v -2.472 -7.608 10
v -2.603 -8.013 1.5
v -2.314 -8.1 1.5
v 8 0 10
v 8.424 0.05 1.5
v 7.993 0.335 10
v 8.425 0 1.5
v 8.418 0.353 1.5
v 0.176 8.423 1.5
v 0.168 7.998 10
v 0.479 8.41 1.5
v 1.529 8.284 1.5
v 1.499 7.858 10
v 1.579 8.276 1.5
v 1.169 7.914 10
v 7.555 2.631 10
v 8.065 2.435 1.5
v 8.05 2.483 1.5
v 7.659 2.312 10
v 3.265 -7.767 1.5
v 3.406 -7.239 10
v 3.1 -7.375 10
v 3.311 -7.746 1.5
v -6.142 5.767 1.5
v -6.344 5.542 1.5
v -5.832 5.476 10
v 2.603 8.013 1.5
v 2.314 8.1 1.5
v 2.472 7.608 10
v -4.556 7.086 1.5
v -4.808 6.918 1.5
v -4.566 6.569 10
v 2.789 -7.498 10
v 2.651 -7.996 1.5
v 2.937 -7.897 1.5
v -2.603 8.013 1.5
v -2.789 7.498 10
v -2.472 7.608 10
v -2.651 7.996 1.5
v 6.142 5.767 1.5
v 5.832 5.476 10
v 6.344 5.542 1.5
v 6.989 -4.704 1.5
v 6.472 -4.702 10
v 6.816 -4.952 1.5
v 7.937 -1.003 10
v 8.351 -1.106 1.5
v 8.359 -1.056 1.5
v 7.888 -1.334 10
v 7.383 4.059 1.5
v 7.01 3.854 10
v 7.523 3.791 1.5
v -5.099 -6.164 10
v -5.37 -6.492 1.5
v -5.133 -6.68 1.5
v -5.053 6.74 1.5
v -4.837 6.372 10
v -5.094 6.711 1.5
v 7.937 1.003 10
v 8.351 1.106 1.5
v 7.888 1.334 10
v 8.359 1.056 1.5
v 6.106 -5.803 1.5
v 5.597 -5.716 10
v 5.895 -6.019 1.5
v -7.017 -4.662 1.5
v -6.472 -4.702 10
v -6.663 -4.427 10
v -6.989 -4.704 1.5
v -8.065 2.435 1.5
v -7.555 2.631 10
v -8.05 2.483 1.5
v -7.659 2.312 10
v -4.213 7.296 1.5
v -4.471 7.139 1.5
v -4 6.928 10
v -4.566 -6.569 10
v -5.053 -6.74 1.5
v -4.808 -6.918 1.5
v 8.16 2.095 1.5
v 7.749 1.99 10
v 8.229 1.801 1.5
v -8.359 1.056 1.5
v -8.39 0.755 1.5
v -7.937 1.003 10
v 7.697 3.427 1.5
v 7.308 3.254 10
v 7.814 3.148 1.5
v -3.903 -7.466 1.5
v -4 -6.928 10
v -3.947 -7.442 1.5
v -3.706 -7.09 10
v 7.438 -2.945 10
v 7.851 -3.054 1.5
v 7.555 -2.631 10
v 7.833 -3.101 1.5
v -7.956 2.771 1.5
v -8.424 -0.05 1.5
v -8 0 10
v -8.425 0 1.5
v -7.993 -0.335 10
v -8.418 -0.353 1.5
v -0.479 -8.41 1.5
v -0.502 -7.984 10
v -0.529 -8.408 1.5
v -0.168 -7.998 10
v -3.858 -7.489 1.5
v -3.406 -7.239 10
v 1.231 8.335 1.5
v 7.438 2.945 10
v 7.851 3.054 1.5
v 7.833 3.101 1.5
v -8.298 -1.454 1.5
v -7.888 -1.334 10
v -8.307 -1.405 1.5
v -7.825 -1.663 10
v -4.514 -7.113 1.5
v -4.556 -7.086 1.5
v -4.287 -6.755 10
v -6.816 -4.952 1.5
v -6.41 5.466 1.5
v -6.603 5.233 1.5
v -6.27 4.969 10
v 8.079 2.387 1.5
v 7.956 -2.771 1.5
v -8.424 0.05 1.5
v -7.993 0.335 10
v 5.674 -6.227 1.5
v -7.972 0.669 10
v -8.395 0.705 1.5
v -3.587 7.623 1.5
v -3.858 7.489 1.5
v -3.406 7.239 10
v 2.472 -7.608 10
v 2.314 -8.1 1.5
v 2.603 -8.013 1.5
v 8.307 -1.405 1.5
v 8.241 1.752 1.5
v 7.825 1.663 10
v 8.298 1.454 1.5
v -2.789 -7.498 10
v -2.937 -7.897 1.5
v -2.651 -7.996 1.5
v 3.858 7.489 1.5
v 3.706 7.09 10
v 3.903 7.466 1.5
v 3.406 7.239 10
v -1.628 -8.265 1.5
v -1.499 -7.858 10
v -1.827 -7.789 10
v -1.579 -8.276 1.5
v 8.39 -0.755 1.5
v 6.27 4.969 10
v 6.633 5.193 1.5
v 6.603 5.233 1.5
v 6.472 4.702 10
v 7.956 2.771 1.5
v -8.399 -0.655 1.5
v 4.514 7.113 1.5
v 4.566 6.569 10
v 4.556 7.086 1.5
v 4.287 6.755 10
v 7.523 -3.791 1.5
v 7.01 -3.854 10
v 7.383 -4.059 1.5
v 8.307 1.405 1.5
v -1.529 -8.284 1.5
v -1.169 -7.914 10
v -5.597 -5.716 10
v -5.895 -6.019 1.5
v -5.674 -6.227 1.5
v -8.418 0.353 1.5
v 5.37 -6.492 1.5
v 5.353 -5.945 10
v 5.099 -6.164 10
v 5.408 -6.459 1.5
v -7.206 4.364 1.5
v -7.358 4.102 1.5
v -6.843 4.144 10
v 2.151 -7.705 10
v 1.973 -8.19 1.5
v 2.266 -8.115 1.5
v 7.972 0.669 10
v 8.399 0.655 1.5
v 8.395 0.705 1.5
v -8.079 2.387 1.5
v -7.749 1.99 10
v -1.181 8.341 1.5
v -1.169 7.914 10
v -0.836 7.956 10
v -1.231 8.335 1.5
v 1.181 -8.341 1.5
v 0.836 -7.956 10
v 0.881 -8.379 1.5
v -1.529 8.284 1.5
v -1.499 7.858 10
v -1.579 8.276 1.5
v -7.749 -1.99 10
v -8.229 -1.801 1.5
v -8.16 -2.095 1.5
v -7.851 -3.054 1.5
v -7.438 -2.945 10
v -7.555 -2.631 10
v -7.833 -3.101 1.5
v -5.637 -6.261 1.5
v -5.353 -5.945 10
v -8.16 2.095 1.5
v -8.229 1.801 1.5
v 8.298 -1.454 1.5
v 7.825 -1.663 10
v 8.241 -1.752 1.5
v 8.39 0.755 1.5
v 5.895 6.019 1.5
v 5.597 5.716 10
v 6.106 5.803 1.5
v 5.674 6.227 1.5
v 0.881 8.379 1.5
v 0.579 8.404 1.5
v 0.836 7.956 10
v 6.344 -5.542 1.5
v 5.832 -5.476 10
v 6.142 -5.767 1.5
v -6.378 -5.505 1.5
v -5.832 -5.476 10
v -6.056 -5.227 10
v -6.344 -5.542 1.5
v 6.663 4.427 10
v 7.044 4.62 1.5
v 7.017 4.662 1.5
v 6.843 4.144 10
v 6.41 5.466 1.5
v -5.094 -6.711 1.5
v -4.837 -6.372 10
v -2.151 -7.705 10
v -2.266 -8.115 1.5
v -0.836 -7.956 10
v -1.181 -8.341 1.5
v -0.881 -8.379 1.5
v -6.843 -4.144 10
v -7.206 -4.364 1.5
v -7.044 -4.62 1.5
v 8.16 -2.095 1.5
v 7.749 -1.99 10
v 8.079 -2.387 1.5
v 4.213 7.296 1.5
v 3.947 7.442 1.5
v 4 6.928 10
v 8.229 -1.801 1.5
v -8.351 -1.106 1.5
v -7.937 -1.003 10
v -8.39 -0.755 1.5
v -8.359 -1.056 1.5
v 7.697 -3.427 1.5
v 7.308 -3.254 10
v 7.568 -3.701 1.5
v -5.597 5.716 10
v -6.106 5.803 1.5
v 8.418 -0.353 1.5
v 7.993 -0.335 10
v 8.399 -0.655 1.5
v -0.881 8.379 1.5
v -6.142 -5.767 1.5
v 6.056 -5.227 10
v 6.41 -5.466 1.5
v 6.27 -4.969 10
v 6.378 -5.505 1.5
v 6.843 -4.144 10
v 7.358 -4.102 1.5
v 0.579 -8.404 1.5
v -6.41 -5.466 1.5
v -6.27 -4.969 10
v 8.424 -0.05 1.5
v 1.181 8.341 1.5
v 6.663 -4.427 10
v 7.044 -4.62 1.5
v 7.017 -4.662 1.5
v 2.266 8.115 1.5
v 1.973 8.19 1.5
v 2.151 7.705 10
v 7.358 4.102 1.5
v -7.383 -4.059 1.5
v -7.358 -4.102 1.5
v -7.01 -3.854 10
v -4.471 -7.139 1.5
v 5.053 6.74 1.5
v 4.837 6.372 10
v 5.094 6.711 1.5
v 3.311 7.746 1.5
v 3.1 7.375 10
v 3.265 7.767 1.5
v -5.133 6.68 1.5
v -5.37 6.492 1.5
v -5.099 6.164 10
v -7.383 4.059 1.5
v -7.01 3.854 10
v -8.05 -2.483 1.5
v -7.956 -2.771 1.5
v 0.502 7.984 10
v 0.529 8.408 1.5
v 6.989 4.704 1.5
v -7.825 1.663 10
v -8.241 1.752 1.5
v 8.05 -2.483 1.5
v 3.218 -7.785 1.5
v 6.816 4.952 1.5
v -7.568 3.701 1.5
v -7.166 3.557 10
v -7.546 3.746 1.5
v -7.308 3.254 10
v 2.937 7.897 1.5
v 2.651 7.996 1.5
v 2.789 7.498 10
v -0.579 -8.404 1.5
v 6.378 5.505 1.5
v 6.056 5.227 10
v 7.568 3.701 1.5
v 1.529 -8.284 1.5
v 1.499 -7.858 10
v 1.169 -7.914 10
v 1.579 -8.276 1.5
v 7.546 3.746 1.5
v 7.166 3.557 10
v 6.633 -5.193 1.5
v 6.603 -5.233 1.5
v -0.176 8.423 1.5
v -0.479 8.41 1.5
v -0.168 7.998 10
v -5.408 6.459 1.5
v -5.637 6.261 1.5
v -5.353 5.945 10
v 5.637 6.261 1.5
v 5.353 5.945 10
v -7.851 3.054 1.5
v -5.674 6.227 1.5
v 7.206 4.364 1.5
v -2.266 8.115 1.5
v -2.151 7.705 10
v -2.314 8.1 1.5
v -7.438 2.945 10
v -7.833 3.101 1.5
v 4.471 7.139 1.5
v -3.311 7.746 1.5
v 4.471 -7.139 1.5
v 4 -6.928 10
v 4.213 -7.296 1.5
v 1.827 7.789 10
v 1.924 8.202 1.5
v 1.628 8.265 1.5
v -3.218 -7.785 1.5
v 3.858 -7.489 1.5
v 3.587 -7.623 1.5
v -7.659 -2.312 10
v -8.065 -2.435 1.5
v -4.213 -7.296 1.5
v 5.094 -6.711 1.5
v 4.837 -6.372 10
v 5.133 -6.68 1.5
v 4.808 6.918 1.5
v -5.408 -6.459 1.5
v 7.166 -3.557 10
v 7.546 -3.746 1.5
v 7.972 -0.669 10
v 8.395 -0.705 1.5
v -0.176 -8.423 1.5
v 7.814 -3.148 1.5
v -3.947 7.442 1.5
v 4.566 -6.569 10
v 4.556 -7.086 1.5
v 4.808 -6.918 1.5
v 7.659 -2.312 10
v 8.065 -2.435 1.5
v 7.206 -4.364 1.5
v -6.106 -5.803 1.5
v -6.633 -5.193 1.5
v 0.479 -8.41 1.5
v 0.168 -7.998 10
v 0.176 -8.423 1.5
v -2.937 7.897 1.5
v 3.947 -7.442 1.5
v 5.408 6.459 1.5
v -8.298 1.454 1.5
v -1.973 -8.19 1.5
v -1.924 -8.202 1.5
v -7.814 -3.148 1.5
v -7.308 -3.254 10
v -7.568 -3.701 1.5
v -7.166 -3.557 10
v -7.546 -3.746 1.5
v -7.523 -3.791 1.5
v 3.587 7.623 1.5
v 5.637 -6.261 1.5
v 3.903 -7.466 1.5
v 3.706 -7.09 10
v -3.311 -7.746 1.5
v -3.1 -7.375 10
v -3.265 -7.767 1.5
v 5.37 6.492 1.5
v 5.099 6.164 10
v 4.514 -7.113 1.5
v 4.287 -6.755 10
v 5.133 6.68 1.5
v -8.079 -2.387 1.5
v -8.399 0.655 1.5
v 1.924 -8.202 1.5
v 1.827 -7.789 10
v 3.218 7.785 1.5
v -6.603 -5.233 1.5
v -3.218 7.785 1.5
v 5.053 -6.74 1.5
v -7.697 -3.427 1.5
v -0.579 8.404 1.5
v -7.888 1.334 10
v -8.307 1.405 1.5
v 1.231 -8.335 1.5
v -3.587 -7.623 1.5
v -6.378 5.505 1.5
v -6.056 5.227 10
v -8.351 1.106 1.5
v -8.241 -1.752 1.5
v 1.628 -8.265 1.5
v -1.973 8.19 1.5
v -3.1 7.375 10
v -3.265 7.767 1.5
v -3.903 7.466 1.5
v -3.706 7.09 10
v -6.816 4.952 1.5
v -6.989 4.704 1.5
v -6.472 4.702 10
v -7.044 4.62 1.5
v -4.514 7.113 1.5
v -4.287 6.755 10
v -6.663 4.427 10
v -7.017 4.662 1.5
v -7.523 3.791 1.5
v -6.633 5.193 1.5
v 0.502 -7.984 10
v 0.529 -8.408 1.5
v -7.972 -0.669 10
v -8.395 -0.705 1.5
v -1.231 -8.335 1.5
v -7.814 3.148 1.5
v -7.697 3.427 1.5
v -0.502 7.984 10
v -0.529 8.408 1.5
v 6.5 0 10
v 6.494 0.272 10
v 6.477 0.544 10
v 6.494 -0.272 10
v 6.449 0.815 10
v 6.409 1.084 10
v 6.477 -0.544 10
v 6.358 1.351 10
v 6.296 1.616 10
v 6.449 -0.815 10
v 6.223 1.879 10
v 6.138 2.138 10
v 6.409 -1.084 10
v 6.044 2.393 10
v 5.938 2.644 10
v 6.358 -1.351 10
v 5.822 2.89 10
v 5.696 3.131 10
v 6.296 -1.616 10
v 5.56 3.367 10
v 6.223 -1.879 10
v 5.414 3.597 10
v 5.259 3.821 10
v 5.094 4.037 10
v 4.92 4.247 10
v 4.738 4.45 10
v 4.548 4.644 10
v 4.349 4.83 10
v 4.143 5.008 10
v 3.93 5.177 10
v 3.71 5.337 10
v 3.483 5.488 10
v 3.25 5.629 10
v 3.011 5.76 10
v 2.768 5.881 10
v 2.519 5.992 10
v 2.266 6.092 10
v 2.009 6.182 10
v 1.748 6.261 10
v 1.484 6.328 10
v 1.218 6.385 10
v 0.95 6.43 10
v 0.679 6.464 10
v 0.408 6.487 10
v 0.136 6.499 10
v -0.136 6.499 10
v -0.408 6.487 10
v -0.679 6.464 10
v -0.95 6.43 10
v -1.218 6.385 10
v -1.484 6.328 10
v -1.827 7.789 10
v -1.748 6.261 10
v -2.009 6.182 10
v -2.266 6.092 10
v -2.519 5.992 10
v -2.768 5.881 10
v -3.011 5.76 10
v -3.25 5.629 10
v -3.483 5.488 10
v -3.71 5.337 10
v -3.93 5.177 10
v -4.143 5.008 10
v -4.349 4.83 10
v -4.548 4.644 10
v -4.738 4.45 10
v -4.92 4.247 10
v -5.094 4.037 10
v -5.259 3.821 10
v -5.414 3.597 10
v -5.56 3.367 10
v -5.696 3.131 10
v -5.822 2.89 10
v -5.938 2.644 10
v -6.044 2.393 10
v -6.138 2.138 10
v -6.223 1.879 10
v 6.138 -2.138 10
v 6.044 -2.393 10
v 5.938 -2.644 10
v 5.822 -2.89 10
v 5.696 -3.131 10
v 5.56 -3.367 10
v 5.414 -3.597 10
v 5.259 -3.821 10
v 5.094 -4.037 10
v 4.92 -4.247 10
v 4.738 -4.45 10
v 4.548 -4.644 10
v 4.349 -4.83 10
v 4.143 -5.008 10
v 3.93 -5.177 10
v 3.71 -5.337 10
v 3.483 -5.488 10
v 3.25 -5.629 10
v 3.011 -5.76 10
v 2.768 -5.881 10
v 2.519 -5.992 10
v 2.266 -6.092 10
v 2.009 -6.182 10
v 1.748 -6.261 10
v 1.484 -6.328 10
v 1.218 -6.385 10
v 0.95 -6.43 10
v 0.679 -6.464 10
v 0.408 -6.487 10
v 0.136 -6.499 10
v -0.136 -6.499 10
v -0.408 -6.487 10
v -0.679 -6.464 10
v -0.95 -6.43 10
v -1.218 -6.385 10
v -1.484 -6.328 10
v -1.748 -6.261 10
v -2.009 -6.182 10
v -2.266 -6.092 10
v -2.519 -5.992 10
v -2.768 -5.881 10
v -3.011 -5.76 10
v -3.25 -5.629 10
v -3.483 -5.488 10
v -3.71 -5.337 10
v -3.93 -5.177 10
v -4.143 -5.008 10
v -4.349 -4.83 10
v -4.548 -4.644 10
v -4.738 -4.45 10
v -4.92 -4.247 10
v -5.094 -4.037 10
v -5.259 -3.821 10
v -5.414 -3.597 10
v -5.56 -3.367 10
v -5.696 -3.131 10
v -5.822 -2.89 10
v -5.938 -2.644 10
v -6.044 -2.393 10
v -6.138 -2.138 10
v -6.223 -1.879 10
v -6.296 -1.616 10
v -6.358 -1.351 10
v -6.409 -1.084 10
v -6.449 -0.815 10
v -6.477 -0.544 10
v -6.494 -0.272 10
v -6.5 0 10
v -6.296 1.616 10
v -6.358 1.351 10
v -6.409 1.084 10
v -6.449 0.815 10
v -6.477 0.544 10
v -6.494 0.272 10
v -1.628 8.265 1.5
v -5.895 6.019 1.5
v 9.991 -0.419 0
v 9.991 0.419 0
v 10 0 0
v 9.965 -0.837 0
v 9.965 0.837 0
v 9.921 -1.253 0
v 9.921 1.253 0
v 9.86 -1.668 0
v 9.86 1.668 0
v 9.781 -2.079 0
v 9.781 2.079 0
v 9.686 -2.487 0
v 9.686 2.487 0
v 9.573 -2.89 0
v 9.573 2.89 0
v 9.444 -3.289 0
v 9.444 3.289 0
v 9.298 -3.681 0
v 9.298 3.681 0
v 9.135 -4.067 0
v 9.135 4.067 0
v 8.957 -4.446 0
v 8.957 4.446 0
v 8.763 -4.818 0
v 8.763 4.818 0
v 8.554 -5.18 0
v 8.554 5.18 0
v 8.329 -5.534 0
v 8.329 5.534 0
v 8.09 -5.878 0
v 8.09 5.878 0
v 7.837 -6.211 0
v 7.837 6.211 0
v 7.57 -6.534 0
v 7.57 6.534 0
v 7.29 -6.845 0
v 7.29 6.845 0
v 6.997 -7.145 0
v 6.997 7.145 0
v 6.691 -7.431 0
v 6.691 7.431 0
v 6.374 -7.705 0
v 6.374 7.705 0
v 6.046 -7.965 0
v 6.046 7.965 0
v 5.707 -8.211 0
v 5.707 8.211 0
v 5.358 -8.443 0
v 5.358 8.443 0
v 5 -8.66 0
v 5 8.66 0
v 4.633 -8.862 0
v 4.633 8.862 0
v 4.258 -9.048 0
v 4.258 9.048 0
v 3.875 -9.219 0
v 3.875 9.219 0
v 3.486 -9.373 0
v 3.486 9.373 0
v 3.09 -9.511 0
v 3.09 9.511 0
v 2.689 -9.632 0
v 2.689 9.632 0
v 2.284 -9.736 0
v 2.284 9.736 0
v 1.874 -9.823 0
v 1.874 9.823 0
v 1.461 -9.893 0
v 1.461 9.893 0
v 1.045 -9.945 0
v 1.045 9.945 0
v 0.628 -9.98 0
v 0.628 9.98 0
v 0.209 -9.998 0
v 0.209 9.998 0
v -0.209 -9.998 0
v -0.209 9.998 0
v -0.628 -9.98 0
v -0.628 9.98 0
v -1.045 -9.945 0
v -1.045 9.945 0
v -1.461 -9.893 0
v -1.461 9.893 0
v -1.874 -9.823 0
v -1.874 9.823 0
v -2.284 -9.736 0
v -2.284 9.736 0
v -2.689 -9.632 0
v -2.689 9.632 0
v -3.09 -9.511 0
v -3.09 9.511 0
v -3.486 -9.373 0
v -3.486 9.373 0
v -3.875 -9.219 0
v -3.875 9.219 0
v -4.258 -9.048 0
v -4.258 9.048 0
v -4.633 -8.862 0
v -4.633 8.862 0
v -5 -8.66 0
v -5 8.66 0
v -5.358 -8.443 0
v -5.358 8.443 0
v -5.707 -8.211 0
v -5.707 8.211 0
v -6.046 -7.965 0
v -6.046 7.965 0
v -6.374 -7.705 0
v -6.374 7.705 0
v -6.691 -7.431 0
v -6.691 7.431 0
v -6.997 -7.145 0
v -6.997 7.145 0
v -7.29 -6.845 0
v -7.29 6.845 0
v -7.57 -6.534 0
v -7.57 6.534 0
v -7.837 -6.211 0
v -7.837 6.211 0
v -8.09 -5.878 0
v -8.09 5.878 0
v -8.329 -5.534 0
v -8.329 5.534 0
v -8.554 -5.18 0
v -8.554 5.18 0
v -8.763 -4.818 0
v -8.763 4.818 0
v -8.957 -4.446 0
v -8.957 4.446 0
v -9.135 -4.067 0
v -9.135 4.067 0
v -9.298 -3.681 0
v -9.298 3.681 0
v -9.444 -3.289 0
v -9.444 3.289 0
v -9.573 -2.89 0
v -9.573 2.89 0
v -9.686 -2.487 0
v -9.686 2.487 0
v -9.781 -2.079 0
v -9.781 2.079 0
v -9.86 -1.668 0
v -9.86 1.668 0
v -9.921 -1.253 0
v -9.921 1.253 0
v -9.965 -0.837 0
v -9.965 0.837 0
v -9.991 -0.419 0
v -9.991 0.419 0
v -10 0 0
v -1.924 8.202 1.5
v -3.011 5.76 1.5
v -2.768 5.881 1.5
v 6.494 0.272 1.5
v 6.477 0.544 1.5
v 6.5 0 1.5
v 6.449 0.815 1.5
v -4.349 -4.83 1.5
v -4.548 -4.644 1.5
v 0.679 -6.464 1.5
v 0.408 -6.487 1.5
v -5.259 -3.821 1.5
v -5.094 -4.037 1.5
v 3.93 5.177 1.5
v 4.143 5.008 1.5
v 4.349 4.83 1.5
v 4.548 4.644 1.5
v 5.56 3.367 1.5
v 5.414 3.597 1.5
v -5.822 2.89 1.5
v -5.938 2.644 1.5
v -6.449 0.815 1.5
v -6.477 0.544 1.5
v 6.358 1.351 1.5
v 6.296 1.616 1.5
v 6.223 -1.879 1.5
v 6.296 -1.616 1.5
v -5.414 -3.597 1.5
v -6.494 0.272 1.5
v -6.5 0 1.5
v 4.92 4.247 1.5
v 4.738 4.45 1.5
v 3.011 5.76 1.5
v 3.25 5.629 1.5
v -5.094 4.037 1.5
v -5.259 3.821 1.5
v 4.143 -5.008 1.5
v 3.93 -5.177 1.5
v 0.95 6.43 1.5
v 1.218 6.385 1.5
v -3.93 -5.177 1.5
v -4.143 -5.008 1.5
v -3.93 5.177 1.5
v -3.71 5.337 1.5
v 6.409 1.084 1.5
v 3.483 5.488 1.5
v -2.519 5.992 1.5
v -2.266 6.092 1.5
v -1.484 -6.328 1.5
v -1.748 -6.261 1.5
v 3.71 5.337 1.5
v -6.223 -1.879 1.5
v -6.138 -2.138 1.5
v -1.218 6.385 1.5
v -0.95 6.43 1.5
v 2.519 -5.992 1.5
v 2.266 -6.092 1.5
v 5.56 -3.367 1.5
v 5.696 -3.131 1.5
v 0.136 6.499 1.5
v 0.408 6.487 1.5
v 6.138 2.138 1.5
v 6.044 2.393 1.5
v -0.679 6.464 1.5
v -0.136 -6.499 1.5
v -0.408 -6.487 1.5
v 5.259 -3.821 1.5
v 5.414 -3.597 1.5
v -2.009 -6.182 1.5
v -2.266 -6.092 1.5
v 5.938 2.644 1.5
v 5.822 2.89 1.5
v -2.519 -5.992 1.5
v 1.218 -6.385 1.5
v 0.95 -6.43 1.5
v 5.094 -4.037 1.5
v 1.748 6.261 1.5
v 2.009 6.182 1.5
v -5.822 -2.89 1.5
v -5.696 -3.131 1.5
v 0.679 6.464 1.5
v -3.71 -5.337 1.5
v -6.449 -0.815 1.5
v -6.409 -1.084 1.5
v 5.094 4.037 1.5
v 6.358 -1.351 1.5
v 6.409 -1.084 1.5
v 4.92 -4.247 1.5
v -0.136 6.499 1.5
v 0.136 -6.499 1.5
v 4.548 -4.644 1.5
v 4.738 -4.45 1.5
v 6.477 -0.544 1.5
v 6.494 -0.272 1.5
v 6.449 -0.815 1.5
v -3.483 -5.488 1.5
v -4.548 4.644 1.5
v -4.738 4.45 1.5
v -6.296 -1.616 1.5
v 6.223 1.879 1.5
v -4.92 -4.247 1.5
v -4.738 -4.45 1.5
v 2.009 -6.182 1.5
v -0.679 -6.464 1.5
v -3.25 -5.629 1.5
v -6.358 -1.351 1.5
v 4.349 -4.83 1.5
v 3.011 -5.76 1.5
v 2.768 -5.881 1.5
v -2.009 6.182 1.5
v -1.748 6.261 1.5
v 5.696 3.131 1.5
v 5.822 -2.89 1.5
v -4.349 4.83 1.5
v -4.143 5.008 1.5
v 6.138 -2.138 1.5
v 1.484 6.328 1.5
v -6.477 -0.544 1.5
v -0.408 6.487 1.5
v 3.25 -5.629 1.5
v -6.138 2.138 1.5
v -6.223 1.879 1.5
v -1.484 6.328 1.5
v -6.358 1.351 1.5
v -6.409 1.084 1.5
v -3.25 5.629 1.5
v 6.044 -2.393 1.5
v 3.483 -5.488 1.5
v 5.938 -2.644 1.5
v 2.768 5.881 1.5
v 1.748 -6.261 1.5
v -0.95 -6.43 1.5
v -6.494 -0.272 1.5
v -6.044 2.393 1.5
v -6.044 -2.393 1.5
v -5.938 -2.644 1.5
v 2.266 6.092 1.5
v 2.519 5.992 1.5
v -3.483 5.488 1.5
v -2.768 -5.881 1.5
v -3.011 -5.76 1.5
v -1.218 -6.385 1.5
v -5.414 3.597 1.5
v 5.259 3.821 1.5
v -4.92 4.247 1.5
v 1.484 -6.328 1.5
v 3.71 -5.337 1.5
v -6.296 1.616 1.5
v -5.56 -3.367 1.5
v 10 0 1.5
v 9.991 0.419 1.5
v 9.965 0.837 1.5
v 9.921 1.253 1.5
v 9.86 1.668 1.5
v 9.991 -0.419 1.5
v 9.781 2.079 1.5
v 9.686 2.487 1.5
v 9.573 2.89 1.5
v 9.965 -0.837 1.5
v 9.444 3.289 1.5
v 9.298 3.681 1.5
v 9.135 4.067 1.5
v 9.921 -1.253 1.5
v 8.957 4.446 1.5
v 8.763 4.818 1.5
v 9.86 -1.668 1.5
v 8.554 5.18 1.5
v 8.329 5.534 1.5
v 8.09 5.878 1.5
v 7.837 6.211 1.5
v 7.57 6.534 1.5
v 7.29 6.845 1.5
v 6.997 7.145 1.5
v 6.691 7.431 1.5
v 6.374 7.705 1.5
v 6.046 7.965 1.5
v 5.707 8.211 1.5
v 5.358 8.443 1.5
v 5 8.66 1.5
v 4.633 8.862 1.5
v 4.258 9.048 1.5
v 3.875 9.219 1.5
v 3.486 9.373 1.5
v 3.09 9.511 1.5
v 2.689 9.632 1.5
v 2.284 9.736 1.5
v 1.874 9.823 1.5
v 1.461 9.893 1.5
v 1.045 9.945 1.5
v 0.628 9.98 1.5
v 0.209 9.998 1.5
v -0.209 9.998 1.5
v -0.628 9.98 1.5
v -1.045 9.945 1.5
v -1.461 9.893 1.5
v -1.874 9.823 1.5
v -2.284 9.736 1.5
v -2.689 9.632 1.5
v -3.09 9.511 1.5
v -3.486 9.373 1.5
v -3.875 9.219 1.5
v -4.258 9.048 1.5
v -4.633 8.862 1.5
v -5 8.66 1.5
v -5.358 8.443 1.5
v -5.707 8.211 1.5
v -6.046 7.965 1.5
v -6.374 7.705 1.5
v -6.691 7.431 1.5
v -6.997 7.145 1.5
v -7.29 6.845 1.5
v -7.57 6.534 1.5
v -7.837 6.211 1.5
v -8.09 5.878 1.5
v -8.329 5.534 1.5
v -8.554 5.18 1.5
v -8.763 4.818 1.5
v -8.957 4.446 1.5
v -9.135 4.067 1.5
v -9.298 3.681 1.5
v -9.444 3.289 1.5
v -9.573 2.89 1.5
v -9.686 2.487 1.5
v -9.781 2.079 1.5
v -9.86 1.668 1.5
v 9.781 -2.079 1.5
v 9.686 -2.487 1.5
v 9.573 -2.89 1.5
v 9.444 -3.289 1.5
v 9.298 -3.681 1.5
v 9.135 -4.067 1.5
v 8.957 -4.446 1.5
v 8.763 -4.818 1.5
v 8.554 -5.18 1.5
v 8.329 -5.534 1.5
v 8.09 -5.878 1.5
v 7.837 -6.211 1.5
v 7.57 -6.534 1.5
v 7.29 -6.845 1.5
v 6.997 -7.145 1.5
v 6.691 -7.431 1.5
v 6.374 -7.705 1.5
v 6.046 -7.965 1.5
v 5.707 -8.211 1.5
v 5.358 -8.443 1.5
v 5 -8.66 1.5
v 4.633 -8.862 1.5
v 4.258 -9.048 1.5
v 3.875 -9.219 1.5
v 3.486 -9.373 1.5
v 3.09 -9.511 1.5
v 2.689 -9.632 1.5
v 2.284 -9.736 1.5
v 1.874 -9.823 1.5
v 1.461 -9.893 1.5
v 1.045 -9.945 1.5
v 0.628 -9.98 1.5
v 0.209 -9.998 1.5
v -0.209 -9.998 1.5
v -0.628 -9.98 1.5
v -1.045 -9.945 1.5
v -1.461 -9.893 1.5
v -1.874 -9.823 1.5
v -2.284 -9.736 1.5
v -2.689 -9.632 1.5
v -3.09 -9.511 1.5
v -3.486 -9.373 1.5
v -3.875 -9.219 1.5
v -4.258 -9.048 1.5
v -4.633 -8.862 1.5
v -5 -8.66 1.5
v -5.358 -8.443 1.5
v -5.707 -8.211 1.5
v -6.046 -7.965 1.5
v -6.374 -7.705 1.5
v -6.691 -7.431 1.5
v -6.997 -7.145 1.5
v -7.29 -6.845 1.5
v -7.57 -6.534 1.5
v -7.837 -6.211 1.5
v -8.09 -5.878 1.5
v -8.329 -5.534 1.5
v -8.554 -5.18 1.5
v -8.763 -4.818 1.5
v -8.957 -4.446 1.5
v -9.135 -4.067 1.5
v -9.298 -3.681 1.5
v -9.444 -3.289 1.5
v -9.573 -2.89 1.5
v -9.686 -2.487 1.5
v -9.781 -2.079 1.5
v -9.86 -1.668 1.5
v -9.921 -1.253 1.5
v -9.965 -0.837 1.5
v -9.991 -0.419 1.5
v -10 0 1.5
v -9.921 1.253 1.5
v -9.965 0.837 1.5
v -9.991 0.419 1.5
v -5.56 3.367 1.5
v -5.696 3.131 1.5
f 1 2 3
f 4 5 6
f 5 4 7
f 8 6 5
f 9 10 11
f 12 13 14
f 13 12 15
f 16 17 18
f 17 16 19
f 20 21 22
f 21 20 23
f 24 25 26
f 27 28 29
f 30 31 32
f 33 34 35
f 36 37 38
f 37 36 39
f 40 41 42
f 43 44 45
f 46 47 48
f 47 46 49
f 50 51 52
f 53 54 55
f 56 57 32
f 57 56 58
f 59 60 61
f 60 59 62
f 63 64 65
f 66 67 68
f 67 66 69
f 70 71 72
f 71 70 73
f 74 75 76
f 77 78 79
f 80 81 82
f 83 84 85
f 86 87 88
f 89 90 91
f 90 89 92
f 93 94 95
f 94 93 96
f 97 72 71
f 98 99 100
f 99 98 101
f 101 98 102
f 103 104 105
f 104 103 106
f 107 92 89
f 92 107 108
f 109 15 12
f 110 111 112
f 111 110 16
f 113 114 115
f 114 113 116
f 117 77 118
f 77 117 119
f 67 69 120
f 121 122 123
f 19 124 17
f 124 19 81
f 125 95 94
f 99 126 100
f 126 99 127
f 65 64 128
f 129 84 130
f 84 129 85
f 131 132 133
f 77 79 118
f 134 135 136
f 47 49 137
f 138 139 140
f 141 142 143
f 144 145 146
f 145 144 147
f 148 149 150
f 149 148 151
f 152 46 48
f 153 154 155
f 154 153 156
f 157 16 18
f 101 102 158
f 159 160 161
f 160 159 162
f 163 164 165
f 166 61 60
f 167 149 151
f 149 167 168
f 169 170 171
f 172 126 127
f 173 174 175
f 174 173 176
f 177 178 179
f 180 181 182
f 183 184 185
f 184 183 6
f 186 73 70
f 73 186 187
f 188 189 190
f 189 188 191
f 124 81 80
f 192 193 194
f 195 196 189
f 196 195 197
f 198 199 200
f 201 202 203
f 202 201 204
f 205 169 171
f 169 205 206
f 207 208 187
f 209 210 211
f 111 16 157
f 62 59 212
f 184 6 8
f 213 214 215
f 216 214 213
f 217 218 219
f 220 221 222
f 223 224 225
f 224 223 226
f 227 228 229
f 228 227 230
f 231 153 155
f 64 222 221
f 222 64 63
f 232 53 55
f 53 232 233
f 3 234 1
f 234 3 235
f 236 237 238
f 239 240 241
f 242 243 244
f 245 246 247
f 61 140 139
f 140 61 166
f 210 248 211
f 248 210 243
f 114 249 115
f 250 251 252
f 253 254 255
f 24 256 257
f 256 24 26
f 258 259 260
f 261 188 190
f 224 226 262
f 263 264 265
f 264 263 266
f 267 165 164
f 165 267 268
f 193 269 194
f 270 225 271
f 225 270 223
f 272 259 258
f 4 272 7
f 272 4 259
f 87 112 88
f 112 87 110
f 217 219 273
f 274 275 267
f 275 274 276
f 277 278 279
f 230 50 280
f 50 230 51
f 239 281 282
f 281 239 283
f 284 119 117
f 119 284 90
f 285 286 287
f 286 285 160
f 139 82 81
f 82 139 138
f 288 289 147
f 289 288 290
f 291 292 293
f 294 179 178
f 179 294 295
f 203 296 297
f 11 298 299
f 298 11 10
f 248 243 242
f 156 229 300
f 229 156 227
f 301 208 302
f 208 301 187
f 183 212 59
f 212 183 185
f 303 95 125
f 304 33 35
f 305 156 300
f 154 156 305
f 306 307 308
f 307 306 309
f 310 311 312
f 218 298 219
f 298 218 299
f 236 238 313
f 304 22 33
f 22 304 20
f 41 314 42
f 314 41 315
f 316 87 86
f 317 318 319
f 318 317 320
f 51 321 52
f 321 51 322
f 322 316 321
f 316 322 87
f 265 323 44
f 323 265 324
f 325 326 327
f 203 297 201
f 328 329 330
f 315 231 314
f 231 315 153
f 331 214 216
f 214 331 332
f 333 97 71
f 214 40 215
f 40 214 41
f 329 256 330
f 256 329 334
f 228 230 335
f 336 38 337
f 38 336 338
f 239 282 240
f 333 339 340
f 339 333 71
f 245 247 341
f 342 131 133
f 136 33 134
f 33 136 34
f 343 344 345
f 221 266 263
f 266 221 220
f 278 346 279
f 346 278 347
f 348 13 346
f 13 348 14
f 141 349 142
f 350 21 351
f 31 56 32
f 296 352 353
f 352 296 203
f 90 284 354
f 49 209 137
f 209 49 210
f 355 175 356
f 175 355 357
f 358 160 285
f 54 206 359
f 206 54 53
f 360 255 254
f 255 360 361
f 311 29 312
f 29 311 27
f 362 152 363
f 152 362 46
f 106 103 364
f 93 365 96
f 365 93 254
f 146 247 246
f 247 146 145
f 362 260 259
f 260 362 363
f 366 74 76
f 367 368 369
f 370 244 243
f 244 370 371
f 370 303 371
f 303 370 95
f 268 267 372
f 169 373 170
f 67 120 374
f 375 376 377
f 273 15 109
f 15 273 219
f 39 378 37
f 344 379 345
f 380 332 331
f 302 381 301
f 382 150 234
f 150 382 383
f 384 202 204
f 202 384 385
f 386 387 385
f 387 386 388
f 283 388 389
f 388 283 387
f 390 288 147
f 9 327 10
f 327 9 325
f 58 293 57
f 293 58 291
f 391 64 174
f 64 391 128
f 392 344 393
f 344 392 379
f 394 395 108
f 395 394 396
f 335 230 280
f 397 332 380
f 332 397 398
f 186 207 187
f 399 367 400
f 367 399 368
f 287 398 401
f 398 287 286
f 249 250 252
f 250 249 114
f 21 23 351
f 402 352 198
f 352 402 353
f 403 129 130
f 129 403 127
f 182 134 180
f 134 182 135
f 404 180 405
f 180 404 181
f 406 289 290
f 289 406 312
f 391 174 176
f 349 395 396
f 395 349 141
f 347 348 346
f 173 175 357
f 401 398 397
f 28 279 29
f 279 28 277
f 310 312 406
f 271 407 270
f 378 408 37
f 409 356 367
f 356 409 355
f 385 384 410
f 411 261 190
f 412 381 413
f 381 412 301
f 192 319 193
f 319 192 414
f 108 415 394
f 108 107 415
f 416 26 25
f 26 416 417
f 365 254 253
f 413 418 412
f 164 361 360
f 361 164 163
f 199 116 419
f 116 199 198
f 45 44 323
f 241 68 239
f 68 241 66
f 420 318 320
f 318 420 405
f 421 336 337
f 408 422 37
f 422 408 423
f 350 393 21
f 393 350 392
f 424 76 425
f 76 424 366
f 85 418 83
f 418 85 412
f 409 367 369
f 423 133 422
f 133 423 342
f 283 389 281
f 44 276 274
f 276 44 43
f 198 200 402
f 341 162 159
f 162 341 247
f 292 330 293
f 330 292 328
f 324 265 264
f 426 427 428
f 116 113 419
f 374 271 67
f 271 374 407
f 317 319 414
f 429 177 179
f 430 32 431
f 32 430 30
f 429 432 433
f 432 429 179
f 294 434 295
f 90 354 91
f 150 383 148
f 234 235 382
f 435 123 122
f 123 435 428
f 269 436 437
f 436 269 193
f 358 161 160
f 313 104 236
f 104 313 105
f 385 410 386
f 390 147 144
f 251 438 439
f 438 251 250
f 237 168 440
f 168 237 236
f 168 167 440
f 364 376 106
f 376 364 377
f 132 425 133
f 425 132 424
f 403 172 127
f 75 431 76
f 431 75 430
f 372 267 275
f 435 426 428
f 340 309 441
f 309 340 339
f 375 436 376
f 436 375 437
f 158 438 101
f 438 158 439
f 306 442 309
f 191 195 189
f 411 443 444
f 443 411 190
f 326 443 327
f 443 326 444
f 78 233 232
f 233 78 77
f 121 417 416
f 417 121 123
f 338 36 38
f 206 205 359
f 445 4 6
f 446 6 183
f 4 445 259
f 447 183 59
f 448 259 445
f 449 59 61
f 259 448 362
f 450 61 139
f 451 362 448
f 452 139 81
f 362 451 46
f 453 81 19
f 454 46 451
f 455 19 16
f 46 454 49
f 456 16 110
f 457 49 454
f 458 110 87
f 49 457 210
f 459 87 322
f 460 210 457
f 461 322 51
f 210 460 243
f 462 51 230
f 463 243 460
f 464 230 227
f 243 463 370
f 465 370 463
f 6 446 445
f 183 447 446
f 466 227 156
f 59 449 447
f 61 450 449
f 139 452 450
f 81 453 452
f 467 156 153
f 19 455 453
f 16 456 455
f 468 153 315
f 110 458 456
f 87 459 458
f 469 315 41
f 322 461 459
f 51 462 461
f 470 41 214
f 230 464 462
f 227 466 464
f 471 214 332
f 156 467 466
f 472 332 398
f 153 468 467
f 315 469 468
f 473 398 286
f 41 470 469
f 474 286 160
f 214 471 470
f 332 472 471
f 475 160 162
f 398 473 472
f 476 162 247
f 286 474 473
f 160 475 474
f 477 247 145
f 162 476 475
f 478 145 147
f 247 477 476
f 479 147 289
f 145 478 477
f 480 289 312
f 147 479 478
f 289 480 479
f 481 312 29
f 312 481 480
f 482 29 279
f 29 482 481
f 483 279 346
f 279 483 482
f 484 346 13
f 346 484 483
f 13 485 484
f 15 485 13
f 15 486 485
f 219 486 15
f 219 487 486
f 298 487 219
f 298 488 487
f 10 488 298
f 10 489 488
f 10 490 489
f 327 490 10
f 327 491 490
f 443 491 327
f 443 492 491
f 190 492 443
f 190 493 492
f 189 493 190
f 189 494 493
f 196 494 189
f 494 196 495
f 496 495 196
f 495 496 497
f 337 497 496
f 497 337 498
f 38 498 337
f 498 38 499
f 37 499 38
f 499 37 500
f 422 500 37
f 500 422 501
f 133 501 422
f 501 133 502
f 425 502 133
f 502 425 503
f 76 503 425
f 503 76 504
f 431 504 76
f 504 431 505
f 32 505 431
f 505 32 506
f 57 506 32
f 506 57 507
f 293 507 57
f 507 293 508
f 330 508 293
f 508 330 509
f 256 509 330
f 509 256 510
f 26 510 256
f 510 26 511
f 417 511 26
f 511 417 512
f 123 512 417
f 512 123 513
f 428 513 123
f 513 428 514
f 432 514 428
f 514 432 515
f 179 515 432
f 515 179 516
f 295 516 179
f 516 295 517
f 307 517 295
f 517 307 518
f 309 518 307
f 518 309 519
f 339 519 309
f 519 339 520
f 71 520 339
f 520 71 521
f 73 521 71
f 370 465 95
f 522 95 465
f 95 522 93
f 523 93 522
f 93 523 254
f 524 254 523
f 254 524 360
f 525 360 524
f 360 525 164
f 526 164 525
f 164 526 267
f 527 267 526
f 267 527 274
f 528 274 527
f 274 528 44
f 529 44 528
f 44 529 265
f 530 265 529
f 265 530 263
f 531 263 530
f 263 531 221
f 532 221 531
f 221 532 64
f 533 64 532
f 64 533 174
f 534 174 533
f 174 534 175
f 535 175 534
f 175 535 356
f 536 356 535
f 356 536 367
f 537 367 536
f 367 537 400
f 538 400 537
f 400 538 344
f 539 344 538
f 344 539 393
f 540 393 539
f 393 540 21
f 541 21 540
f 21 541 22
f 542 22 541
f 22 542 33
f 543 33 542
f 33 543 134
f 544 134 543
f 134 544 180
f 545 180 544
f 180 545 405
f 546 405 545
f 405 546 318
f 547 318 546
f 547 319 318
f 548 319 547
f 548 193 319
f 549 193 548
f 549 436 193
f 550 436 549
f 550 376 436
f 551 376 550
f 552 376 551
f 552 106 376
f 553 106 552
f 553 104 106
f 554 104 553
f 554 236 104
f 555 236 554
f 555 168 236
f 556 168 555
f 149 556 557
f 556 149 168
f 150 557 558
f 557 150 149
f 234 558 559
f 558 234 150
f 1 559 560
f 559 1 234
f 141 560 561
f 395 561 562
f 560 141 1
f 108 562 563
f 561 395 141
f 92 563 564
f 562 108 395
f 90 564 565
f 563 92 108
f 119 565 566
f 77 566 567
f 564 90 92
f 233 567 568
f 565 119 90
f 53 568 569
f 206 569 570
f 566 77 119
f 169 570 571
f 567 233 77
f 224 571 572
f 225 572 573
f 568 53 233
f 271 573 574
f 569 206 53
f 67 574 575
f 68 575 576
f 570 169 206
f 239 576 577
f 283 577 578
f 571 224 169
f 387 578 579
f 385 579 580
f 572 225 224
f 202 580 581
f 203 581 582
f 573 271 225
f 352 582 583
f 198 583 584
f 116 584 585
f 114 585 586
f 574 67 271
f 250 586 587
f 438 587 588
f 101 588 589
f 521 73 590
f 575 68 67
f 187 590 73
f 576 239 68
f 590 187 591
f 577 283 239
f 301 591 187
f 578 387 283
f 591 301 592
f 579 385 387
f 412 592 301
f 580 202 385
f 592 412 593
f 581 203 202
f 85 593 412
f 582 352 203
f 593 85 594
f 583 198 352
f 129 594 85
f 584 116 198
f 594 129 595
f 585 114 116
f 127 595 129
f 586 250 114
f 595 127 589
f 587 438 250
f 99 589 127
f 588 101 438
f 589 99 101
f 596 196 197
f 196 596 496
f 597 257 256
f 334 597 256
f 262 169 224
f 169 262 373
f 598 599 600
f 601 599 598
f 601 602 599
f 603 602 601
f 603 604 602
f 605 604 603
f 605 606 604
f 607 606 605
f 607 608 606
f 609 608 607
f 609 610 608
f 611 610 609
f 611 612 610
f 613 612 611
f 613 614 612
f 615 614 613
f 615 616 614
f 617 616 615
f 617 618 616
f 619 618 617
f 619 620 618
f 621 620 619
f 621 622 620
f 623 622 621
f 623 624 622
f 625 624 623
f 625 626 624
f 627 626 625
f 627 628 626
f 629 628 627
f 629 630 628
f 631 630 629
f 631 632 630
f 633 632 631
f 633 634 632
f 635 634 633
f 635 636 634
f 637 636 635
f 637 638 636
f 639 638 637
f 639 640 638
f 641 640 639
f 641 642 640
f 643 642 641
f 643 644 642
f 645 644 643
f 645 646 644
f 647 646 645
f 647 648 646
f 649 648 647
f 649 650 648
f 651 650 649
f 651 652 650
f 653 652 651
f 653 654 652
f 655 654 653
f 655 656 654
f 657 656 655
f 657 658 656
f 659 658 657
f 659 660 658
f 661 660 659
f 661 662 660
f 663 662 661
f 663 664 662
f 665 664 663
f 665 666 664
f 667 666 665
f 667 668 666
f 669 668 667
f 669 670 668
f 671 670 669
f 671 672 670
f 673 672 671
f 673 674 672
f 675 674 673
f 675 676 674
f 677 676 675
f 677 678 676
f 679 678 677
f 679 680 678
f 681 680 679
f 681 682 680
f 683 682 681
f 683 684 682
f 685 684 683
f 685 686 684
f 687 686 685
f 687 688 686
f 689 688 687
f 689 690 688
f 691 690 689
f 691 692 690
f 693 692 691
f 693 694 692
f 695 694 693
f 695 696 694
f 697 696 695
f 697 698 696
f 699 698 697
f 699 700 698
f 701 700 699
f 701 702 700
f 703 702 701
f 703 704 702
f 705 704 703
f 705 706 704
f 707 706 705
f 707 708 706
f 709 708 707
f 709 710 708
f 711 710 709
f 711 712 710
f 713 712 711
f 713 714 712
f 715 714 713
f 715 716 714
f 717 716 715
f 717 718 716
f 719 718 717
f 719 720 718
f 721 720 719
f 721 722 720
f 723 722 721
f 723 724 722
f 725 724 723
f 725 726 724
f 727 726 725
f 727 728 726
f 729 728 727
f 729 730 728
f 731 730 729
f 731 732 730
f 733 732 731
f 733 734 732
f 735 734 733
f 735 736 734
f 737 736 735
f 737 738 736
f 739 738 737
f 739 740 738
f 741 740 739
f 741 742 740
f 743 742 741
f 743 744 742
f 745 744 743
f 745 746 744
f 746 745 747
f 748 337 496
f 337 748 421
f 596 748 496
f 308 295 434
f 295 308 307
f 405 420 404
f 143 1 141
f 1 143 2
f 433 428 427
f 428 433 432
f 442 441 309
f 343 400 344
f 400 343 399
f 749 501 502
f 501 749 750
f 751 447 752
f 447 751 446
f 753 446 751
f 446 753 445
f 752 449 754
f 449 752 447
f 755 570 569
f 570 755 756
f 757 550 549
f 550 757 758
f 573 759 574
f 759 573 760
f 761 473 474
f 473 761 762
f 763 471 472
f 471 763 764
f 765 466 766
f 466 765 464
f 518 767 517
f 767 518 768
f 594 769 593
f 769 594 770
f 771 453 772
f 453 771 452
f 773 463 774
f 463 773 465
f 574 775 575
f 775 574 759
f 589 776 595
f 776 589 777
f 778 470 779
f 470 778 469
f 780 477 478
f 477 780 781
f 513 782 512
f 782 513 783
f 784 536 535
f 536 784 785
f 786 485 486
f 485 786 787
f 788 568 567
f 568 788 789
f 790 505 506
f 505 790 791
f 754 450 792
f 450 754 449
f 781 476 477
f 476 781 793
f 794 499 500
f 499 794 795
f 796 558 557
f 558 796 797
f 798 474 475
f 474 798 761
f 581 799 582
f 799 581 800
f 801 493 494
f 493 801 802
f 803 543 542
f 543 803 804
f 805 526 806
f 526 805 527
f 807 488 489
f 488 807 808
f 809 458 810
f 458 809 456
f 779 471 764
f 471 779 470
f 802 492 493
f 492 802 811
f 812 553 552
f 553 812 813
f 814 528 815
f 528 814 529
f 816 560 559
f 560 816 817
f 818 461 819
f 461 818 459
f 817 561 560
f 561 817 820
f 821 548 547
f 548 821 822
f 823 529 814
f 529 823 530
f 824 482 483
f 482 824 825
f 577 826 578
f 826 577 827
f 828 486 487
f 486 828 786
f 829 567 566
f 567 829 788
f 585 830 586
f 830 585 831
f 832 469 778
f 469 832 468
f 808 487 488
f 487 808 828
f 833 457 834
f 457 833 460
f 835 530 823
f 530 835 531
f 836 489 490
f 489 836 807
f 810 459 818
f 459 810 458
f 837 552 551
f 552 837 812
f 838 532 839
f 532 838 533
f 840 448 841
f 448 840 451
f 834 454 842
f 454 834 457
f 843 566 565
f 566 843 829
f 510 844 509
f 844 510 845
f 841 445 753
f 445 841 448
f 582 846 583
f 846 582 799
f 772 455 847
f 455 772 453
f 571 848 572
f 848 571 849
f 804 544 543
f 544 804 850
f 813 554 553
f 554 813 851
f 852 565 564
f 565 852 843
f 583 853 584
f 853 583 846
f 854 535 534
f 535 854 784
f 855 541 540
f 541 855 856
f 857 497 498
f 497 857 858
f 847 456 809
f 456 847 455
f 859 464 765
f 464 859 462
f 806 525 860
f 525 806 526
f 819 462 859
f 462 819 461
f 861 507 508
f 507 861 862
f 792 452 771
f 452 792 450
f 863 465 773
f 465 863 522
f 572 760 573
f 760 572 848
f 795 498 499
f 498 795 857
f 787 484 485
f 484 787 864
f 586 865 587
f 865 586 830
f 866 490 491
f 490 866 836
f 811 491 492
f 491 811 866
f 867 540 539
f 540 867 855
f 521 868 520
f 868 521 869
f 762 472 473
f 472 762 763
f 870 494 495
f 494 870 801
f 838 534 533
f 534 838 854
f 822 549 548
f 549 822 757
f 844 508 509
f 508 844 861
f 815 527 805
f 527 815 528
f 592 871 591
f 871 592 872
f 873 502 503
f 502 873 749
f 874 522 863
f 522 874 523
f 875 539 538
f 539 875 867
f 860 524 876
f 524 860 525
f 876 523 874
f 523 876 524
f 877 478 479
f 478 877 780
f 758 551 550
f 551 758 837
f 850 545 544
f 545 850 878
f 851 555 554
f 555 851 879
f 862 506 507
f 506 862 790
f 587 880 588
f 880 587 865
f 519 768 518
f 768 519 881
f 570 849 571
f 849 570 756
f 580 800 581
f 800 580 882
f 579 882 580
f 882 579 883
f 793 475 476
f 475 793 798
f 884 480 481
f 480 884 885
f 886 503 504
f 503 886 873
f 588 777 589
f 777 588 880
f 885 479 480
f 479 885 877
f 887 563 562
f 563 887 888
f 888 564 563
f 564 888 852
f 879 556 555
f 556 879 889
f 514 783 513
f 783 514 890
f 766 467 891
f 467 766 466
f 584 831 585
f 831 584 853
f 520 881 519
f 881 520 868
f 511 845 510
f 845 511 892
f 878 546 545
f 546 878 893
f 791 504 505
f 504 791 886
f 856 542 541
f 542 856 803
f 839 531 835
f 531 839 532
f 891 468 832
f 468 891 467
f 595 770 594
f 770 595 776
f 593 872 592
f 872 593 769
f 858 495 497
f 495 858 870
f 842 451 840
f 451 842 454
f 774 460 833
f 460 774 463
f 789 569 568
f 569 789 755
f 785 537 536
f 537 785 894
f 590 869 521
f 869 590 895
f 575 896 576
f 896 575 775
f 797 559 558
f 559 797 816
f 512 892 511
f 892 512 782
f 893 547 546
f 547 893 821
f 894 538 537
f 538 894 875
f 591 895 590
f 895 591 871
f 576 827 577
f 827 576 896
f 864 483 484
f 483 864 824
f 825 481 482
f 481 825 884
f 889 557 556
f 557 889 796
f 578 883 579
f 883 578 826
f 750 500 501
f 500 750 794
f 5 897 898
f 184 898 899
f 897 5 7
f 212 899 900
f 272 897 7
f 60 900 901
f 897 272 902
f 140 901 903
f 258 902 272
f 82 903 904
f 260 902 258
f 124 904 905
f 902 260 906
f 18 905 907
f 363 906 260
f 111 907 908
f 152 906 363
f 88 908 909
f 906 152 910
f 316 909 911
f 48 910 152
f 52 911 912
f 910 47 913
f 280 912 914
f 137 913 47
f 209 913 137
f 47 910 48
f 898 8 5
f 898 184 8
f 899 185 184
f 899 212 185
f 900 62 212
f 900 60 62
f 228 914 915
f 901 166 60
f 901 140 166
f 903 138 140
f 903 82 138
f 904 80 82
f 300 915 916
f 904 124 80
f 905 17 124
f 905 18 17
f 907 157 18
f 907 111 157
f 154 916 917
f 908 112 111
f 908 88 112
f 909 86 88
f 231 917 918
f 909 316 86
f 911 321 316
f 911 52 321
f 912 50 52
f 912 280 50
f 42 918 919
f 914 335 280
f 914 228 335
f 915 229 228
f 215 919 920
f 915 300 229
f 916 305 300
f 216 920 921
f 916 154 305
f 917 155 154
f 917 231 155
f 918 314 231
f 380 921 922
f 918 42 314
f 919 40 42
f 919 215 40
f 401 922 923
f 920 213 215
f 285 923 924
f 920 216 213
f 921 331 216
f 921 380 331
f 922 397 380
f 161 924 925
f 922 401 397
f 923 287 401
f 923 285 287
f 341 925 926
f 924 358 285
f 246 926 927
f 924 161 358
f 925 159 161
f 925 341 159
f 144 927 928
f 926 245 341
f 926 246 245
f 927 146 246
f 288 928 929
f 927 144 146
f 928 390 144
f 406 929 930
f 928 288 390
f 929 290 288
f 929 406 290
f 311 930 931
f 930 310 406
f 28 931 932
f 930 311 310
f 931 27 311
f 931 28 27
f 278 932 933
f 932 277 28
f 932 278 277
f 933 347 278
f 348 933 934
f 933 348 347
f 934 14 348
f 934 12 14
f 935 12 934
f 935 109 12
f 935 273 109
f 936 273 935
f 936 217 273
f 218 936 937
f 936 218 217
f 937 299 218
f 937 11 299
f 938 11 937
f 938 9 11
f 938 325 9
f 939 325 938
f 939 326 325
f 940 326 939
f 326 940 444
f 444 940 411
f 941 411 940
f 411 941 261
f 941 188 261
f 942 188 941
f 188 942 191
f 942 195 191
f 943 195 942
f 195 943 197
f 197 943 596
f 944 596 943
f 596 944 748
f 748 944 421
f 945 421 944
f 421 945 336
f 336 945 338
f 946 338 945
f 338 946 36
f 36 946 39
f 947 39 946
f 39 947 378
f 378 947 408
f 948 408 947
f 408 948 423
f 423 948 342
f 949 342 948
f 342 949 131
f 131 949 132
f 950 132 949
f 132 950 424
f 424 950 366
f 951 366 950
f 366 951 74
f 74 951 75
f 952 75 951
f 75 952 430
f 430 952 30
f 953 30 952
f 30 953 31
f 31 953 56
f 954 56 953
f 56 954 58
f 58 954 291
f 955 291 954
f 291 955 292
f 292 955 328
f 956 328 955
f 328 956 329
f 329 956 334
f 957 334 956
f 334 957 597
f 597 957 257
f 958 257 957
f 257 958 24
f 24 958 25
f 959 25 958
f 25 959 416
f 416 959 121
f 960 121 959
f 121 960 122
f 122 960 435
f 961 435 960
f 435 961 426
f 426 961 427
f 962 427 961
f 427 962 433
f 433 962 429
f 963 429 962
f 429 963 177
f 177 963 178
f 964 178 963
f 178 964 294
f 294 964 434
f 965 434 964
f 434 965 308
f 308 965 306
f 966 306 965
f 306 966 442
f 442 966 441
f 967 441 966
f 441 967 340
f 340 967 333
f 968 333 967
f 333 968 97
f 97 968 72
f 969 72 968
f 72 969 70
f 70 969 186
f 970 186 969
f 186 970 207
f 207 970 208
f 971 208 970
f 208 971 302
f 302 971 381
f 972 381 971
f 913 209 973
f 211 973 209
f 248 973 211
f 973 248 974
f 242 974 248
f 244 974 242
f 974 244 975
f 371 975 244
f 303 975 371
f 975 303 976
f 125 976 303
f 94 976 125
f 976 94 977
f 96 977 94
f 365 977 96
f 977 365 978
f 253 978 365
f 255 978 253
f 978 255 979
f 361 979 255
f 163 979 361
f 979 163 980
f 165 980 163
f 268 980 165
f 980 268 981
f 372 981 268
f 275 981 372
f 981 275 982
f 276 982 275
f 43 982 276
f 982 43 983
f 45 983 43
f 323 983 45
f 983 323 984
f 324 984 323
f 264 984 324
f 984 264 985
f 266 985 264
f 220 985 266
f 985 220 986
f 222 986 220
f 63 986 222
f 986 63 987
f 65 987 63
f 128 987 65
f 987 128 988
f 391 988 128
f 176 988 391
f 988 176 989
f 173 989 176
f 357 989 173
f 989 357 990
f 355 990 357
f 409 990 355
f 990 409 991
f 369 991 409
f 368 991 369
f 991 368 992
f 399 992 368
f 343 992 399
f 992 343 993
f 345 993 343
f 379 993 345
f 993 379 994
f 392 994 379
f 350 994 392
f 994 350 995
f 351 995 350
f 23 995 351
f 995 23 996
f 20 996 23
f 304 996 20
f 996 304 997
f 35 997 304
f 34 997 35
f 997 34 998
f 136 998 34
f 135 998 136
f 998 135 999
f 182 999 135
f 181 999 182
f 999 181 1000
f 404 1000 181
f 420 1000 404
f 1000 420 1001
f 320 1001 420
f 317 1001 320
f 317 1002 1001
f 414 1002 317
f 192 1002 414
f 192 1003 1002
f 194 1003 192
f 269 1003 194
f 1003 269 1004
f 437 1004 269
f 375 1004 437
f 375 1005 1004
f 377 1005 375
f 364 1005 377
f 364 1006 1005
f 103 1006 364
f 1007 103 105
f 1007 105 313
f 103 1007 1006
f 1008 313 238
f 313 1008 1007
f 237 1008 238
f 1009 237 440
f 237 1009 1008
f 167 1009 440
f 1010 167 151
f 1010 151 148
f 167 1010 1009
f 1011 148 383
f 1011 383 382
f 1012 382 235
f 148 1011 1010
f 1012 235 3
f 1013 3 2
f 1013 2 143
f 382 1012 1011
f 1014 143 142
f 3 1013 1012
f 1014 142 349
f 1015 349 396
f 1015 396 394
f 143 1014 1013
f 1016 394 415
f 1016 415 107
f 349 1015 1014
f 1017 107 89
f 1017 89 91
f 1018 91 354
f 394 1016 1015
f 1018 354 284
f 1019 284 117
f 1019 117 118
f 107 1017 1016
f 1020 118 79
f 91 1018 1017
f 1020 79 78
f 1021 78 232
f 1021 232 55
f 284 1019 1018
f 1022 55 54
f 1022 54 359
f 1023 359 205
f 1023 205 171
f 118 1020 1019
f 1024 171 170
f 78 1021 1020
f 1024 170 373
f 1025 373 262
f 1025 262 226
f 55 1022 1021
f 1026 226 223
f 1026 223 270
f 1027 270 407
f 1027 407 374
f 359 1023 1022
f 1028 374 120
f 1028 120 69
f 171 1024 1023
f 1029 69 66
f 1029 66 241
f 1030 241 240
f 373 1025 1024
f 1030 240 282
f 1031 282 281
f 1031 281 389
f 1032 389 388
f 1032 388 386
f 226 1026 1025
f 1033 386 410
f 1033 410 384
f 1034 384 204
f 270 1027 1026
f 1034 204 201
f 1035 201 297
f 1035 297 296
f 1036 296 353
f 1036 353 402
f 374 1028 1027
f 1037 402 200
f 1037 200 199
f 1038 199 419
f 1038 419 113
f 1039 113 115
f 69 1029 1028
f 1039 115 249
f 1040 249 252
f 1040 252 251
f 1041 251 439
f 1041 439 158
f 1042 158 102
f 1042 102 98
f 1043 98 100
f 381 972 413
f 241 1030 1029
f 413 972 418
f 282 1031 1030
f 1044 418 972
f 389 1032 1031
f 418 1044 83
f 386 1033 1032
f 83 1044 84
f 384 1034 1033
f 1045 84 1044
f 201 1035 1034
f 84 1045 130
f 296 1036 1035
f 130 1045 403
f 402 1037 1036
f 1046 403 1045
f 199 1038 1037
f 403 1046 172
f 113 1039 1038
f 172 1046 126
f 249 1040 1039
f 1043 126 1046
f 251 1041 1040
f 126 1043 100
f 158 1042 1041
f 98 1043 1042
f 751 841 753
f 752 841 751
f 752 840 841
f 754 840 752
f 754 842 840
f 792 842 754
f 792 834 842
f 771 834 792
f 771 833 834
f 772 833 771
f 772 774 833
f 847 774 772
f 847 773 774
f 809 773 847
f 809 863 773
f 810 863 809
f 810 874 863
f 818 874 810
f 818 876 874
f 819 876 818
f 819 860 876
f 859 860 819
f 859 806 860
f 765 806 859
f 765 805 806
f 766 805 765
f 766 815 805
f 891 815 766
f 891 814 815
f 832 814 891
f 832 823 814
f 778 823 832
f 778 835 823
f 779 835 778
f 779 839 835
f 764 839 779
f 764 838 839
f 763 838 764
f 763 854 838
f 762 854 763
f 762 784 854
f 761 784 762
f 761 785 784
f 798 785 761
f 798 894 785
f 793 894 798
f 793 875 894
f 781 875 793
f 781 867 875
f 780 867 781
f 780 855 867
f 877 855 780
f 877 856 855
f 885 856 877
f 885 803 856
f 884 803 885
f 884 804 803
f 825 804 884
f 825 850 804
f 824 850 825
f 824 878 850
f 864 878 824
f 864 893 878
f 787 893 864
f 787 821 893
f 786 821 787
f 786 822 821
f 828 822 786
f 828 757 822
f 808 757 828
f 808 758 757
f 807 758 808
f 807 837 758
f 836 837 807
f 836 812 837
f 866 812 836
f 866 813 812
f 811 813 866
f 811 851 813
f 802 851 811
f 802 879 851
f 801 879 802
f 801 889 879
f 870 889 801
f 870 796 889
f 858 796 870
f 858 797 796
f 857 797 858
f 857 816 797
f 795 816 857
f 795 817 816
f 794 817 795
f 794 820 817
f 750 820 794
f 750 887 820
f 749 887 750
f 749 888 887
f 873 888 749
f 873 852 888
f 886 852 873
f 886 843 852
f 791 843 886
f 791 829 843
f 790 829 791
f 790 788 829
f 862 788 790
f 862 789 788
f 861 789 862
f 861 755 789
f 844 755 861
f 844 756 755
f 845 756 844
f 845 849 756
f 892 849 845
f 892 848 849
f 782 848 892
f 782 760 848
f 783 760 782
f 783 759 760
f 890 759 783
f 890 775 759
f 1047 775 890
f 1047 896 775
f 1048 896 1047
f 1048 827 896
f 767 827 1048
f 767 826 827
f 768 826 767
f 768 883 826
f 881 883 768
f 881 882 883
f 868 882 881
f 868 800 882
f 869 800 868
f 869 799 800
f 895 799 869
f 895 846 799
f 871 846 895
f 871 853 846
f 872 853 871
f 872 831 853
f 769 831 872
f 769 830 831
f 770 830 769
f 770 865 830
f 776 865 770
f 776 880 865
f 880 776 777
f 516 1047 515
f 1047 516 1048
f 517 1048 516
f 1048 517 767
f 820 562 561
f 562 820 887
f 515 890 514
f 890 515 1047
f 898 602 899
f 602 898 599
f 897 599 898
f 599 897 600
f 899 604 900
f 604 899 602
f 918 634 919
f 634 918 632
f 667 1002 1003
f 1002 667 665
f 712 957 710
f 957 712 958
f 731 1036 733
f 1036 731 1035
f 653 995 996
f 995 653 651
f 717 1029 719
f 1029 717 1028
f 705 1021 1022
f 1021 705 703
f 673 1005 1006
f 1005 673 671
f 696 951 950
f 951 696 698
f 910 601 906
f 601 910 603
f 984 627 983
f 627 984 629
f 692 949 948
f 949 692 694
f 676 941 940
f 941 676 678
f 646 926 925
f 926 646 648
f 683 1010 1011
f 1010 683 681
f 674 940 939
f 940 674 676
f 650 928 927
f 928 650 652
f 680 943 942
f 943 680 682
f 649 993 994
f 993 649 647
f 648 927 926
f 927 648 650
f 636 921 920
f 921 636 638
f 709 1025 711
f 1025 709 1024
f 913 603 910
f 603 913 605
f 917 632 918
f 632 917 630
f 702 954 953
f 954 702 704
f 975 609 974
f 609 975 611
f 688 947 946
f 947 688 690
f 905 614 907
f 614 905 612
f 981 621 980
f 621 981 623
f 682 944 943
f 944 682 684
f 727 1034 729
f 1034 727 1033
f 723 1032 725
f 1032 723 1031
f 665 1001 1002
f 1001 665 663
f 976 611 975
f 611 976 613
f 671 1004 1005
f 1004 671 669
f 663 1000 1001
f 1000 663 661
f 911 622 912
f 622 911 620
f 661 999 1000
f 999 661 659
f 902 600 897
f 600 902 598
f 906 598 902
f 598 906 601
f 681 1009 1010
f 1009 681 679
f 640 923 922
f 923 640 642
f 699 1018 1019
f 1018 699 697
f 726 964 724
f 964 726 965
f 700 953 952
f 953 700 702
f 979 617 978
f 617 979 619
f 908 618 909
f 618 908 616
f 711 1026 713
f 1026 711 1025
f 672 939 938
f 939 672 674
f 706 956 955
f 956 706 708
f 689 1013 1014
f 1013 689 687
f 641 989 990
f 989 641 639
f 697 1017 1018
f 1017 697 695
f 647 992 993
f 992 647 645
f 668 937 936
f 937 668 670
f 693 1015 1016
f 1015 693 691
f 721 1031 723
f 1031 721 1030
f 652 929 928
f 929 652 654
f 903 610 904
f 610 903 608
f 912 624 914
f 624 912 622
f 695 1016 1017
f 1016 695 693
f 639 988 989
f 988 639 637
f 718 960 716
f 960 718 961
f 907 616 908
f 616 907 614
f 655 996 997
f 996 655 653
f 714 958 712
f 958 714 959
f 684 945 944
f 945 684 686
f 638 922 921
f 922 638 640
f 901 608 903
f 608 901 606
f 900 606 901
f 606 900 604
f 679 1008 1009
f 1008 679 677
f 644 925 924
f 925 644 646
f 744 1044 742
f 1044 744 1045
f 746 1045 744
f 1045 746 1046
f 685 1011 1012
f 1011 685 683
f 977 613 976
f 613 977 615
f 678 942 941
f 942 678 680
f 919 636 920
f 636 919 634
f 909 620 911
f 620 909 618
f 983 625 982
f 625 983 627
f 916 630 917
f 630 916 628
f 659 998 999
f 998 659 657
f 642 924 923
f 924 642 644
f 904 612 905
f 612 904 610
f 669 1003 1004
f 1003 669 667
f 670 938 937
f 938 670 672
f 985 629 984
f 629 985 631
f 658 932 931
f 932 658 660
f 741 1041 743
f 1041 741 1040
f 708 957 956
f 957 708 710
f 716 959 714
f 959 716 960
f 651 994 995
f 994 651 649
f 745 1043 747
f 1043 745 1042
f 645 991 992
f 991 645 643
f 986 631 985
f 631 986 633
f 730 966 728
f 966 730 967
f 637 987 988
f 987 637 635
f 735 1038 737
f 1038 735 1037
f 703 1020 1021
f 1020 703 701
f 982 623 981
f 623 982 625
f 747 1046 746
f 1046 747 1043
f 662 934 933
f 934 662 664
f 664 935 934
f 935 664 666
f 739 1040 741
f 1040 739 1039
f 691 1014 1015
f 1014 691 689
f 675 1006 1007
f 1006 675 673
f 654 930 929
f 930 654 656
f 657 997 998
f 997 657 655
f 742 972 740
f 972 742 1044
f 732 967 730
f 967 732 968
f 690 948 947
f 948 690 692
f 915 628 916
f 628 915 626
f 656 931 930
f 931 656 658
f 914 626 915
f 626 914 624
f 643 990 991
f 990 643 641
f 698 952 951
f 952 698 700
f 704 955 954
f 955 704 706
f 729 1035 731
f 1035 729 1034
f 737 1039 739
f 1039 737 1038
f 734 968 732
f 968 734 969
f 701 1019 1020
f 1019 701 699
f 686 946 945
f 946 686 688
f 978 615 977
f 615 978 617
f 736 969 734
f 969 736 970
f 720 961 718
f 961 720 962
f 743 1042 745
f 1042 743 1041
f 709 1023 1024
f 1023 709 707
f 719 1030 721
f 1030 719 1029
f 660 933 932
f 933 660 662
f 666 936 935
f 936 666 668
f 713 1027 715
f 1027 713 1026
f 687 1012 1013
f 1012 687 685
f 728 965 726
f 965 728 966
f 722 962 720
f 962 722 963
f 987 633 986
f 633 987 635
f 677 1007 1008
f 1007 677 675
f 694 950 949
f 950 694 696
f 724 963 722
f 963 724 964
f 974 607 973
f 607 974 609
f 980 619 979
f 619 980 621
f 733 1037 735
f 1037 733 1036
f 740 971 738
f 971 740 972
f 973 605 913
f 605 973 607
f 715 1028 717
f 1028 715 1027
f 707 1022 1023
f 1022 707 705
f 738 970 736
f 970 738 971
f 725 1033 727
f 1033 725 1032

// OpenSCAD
// [FL_INDEX: keywords="openscad, 3d_parametric, Pipe_Cap, csg_solid" | COT="Parametric OpenSCAD design from 3DCodeverse"]
// Title: Pipe Cap

higth=10; //[5:100]
top_with=16; //[5:100]
bottum_with=17; //[5:100]
wall_thikness=1.5; //[0.5:10]
pipe_thikness=1.5; //[0.5:10]

/* [Hidden] */
$fn = 150;
cap();

module cap(){
	cylinder(wall_thikness,((bottum_with/2)+pipe_thikness),((bottum_with/2)+pipe_thikness));
	difference(){	
		cylinder(higth,(bottum_with/2),(top_with/2));
		translate([0,0,wall_thikness])cylinder(h=higth,r=((min(bottum_with,top_with)/2)-wall_thikness));
	}
}
